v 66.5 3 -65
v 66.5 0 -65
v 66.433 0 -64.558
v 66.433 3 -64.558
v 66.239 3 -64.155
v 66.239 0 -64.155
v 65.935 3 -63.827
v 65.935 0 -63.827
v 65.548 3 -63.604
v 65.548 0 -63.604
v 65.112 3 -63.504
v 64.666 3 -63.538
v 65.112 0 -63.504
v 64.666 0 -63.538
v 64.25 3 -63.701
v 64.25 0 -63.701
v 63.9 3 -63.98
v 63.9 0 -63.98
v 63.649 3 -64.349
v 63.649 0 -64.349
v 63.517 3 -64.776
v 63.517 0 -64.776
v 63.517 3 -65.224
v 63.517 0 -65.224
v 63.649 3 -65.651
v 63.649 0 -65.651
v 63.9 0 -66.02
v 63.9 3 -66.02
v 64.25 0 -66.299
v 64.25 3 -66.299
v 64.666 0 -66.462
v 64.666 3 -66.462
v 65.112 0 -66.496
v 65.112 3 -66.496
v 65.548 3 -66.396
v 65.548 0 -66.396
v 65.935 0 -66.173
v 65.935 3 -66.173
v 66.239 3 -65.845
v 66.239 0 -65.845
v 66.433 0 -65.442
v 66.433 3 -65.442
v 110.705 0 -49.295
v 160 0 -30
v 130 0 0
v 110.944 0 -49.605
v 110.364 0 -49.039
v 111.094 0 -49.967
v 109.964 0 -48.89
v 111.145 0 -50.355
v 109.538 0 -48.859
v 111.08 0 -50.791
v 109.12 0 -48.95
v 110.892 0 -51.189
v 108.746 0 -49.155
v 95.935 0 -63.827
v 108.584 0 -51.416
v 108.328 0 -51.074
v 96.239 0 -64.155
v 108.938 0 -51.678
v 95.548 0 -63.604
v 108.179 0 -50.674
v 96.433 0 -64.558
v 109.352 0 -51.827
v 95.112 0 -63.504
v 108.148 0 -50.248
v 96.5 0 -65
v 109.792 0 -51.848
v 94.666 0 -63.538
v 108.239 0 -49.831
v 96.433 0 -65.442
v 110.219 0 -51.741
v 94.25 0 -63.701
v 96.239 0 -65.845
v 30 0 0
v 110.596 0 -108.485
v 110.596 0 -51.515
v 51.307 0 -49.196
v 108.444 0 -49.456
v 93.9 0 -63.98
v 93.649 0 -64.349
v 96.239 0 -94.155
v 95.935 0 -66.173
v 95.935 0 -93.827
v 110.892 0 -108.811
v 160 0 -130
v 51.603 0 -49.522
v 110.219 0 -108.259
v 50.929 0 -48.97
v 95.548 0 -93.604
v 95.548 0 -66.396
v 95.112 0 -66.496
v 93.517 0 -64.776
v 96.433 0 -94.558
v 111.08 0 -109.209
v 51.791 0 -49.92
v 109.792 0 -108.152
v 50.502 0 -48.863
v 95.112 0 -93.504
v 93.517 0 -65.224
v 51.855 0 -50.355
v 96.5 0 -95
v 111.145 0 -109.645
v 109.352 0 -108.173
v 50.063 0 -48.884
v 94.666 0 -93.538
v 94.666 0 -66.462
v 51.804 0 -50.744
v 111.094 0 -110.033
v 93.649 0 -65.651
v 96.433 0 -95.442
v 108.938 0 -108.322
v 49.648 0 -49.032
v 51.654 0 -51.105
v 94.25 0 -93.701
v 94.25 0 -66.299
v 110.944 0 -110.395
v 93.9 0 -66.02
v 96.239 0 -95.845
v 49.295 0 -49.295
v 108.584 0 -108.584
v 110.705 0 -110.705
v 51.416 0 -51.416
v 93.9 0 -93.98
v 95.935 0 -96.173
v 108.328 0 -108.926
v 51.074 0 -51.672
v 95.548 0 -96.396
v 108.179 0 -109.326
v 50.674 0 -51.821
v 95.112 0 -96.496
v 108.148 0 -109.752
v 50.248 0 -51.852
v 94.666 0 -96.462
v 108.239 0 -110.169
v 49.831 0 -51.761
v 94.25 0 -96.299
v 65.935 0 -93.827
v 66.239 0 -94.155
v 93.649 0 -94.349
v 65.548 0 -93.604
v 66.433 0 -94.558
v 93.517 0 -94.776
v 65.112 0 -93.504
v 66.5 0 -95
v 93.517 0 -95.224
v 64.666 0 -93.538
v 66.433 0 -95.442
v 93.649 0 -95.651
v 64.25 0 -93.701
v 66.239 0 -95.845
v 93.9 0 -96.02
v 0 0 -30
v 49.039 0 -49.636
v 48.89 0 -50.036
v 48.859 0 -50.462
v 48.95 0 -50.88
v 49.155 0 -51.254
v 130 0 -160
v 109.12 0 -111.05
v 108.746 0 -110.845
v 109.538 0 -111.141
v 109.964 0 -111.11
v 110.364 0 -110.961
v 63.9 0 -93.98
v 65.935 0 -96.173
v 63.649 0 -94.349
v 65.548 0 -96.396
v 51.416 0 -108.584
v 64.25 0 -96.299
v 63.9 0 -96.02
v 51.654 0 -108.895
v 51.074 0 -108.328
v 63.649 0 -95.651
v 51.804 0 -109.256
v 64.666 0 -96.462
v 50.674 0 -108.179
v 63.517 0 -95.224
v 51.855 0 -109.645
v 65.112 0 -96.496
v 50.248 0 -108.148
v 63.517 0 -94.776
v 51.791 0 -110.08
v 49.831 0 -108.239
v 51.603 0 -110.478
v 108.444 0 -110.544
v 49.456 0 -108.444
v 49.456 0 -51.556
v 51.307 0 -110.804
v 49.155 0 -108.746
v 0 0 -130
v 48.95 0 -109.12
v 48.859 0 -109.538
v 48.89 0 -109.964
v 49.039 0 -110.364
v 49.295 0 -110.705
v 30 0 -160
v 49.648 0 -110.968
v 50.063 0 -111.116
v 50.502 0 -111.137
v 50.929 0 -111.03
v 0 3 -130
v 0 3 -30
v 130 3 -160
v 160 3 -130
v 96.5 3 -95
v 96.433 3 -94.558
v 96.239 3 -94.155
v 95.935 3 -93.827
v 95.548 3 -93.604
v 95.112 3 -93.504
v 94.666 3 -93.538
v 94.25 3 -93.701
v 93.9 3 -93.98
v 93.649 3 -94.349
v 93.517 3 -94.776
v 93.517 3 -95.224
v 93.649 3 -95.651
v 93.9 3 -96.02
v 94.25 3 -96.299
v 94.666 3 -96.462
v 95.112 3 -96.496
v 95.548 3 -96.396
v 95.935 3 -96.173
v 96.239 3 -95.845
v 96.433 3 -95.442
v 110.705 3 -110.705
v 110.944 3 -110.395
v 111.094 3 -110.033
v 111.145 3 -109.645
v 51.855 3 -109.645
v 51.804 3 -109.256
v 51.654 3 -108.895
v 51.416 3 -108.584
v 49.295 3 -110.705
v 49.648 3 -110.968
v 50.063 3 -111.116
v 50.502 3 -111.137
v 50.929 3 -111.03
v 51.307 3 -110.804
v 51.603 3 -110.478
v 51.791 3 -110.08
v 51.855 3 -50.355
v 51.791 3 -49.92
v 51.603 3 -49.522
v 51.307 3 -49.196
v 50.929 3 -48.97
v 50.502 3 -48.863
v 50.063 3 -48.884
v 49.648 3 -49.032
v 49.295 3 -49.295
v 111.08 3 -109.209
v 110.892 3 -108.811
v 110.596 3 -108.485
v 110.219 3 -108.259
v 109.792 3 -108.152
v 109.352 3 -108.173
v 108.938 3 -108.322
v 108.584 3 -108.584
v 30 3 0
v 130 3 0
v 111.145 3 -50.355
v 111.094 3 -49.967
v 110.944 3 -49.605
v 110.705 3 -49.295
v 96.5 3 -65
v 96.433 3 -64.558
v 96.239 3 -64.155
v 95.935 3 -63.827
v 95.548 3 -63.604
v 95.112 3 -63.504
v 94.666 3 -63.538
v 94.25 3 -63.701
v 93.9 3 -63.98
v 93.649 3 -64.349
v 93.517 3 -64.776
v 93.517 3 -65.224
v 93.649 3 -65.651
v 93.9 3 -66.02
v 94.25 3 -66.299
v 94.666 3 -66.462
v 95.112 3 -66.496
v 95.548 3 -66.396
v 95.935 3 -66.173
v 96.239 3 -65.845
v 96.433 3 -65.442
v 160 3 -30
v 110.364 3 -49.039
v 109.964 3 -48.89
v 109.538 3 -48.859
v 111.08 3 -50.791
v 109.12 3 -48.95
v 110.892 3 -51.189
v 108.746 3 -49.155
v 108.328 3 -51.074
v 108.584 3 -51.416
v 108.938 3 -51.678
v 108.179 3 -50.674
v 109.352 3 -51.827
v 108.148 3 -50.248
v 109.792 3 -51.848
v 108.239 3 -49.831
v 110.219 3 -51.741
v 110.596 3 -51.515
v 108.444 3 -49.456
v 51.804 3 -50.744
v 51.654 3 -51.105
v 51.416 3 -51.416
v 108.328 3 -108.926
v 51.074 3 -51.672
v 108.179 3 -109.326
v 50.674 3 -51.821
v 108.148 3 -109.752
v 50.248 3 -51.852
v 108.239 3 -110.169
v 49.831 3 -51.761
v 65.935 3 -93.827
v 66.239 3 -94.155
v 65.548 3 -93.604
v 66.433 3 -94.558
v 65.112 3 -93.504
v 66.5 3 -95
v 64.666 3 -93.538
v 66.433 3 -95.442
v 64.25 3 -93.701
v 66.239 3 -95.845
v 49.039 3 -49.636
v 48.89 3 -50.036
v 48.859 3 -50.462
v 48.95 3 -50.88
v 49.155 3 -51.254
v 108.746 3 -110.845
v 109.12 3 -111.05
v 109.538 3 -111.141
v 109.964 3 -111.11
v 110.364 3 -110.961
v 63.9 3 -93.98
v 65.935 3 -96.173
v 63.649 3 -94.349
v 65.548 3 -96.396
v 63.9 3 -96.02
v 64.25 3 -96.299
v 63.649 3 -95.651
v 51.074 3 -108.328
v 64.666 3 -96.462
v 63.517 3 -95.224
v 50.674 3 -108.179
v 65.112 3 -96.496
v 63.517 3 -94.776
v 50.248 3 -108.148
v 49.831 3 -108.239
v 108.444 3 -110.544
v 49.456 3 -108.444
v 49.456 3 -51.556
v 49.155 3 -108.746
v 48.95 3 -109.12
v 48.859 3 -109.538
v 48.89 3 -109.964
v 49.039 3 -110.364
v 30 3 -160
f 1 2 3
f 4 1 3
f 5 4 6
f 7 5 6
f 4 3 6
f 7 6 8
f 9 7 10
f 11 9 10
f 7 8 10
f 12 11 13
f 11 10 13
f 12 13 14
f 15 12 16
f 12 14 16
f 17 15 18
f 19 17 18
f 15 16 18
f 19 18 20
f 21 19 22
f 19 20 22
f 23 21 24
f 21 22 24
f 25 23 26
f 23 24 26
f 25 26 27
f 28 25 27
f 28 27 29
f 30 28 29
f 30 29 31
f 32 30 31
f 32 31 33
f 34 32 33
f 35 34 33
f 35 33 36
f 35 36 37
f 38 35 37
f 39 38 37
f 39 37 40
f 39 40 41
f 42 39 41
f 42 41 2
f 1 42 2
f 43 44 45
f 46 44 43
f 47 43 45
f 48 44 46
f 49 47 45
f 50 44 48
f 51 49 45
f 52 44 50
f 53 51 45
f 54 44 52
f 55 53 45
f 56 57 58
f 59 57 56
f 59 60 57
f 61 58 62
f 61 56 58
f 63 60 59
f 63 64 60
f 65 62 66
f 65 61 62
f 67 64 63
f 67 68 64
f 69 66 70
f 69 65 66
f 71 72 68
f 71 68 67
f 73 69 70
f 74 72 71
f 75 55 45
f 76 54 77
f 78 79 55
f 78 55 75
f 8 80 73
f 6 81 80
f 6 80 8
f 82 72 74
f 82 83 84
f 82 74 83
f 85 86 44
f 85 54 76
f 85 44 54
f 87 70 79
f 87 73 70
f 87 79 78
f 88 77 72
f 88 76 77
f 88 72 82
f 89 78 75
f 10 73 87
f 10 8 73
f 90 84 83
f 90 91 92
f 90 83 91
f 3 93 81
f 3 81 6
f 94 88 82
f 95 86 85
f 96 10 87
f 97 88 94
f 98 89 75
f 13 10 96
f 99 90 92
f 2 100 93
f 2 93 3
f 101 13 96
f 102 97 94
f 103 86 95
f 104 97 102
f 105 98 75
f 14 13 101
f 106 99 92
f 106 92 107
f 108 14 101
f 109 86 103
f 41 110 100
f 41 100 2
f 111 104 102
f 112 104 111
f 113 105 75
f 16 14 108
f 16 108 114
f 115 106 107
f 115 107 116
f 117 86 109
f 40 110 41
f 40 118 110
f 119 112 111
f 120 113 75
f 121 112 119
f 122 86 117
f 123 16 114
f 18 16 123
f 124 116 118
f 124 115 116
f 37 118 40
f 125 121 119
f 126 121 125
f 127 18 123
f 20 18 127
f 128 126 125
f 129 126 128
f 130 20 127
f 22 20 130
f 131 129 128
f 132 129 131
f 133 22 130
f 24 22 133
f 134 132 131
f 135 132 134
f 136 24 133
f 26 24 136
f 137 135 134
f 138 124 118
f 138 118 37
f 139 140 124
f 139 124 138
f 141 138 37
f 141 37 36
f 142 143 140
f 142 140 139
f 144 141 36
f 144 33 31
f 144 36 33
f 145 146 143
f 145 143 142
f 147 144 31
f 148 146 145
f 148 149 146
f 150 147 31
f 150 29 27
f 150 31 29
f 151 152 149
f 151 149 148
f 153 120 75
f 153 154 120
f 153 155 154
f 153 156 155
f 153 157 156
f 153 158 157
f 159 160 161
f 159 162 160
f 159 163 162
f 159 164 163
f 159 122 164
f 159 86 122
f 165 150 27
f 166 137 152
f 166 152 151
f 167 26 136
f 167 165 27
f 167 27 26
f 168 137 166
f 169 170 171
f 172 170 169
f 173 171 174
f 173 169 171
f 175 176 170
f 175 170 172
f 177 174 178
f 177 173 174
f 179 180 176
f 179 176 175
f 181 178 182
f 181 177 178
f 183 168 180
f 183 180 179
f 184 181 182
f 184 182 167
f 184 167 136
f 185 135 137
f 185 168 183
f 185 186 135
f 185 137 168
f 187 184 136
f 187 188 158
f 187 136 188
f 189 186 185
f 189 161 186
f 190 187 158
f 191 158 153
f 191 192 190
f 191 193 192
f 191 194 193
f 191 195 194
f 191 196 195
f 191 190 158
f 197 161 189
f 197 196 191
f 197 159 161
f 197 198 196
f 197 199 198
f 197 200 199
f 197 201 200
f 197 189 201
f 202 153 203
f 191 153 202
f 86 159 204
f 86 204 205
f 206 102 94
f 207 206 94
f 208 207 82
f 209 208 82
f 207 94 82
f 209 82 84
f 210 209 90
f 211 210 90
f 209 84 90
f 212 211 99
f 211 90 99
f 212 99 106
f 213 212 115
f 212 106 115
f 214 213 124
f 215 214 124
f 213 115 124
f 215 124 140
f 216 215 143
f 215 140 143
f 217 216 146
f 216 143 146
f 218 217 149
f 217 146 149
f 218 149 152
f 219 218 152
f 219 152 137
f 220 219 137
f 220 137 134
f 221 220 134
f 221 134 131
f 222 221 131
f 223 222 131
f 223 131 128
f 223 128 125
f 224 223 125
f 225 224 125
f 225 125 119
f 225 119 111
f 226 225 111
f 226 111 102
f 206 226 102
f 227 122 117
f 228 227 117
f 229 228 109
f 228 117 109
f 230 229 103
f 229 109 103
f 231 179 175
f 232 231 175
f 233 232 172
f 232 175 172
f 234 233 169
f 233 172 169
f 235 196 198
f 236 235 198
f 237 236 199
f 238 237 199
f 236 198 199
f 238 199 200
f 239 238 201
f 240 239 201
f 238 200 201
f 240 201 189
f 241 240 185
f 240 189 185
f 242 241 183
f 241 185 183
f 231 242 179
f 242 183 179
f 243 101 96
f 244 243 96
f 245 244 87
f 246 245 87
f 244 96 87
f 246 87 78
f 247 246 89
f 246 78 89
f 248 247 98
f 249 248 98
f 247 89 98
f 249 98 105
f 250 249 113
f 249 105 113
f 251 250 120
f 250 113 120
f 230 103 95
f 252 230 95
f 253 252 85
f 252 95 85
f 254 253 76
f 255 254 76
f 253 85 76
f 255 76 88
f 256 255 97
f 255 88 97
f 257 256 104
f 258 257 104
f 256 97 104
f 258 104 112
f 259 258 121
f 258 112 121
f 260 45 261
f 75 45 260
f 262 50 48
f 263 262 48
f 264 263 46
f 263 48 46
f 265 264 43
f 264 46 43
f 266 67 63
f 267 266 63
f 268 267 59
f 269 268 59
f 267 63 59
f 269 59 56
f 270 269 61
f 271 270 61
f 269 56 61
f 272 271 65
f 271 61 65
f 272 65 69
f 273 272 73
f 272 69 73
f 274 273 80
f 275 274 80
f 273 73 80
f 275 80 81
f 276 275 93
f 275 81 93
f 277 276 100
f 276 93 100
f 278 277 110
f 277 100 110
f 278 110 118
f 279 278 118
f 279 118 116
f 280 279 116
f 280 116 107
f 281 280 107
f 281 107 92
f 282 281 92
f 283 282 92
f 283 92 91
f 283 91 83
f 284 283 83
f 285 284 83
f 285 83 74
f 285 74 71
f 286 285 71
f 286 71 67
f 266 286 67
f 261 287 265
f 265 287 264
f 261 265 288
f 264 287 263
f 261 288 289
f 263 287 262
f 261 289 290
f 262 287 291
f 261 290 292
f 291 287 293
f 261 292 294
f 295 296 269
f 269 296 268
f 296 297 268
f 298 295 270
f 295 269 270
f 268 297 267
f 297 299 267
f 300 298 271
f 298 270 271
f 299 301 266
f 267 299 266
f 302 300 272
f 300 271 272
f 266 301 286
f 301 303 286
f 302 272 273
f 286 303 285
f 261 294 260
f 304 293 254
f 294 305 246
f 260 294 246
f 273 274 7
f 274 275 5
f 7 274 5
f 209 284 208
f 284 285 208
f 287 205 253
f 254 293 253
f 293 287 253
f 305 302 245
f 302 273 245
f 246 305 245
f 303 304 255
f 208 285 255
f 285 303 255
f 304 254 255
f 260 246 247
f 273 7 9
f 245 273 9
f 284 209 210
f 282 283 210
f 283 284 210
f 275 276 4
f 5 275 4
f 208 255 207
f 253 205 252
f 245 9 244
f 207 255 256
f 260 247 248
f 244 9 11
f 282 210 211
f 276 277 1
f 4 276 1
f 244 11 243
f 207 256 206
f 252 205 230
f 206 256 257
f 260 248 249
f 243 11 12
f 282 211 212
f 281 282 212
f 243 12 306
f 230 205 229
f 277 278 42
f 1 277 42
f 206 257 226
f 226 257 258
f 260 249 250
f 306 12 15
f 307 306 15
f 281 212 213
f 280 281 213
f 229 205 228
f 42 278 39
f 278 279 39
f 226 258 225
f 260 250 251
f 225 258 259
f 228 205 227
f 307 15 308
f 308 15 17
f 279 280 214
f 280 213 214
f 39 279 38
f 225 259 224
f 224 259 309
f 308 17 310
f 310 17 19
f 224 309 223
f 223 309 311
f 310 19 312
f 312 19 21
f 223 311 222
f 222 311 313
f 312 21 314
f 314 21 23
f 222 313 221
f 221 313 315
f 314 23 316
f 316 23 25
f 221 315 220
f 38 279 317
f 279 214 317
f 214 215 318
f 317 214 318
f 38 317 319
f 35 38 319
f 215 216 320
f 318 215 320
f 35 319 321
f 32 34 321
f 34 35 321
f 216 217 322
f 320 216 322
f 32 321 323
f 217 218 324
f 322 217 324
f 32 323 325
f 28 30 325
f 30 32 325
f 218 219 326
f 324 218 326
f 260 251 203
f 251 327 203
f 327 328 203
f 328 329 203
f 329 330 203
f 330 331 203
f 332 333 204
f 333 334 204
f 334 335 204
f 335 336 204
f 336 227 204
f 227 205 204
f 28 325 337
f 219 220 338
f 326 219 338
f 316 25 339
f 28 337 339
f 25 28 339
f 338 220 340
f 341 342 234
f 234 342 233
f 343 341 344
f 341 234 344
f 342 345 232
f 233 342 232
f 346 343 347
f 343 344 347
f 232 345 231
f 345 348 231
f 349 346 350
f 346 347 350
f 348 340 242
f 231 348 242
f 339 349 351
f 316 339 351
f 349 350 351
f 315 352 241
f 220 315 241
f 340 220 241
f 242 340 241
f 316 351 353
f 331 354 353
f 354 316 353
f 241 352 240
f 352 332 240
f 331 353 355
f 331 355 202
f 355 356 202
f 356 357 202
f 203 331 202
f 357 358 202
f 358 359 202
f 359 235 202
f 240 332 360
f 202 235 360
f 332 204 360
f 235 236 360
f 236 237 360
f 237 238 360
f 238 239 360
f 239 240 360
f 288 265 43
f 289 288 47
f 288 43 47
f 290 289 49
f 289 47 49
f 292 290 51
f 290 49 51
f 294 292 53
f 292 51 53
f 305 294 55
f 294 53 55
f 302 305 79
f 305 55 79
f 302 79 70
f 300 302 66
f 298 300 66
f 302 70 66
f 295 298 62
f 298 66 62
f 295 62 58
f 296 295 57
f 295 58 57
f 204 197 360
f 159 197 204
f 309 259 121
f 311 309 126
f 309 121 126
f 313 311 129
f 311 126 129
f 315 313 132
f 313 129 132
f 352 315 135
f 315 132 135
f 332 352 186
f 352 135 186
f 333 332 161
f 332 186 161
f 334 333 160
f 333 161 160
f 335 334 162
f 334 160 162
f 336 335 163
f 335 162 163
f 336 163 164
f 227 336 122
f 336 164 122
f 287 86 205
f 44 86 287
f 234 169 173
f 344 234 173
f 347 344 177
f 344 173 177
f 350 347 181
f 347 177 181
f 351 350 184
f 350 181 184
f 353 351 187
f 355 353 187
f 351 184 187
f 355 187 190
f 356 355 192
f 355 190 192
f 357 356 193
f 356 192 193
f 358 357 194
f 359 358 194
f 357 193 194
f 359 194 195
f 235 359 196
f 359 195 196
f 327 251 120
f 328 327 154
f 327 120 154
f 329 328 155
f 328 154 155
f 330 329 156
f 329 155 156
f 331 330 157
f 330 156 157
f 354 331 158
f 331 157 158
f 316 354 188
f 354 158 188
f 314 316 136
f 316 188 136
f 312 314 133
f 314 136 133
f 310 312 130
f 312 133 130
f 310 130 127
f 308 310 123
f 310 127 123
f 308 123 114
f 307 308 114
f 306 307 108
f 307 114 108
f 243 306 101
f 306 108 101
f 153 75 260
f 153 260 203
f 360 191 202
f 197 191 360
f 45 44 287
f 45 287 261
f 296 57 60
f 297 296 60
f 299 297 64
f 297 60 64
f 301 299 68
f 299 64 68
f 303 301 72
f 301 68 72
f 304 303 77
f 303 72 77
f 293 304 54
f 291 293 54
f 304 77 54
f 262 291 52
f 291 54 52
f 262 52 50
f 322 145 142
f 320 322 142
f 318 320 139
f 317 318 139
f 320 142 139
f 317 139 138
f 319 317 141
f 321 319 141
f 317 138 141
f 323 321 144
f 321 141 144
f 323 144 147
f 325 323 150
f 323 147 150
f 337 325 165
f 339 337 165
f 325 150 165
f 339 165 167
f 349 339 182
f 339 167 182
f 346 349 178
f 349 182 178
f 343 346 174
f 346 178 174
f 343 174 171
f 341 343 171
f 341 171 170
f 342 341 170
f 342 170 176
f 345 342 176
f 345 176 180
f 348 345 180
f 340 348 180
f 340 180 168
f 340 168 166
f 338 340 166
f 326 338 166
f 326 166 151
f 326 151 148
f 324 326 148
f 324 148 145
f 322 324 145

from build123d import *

# Parameters (mm, degrees)
BOSS_EXTRUDE1_DEPTH = 3
SKETCH3_R           = 1.5
CUT_EXTRUDE1_DEPTH  = 10


with BuildPart() as part:
    # Sketch1 → Boss-Extrude1 (new body)
    with BuildSketch(Plane(origin=(0, 0, 0), x_dir=(1, 0, 0), z_dir=(0, 1, 0))):
        Polygon((0, 130), (30, 160), (130, 160), (160, 130), (160, 30), (130, 0), (30, 0), (0, 30), align=None)
    extrude(amount=BOSS_EXTRUDE1_DEPTH)

    # Sketch3 → Cut-Extrude1 (cut)
    with BuildSketch(Plane.XZ):
        with BuildLine():
            ThreePointArc((49.294678888, -49.294678888), (49.294678888, -51.415999231), (51.415999231, -51.415999231))
            Line((51.415999231, -51.415999231), (49.294678888, -49.294678888))
        make_face()
        with BuildLine():
            Line((49.294678888, -49.294678888), (51.415999231, -51.415999231))
            ThreePointArc((51.415999231, -51.415999231), (51.741158358, -50.929364208), (51.855339059, -50.355339059))
            ThreePointArc((51.855339059, -50.355339059), (50.929364208, -48.969519761), (49.294678888, -49.294678888))
        make_face()
        with BuildLine():
            ThreePointArc((110.705321112, -49.294678888), (108.584000769, -49.294678888), (108.584000769, -51.415999231))
            Line((108.584000769, -51.415999231), (110.705321112, -49.294678888))
        make_face()
        with BuildLine():
            Line((110.705321112, -49.294678888), (108.584000769, -51.415999231))
            ThreePointArc((108.584000769, -51.415999231), (110.218686089, -51.741158358), (111.144660941, -50.355339059))
            ThreePointArc((111.144660941, -50.355339059), (111.030480239, -49.781313911), (110.705321112, -49.294678888))
        make_face()
        with BuildLine():
            ThreePointArc((111.144660941, -109.644660941), (110.218686089, -108.258841642), (108.584000769, -108.584000769))
            Line((108.584000769, -108.584000769), (110.705321112, -110.705321112))
            ThreePointArc((110.705321112, -110.705321112), (111.030480239, -110.218686089), (111.144660941, -109.644660941))
        make_face()
        with BuildLine():
            Line((110.705321112, -110.705321112), (108.584000769, -108.584000769))
            ThreePointArc((108.584000769, -108.584000769), (108.584000769, -110.705321112), (110.705321112, -110.705321112))
        make_face()
        with BuildLine():
            ThreePointArc((51.415999231, -108.584000769), (49.294678888, -108.584000769), (49.294678888, -110.705321112))
            Line((49.294678888, -110.705321112), (51.415999231, -108.584000769))
        make_face()
        with BuildLine():
            Line((51.415999231, -108.584000769), (49.294678888, -110.705321112))
            ThreePointArc((49.294678888, -110.705321112), (50.929364208, -111.030480239), (51.855339059, -109.644660941))
            ThreePointArc((51.855339059, -109.644660941), (51.741158358, -109.070635792), (51.415999231, -108.584000769))
        make_face()
        with Locations((65, -95)):
            Circle(SKETCH3_R)
        with Locations((95, -95)):
            Circle(SKETCH3_R)
        with Locations((65, -65)):
            Circle(SKETCH3_R)
        with Locations((95, -65)):
            Circle(SKETCH3_R)
    extrude(amount=-CUT_EXTRUDE1_DEPTH, mode=Mode.SUBTRACT)


solid = part.part
